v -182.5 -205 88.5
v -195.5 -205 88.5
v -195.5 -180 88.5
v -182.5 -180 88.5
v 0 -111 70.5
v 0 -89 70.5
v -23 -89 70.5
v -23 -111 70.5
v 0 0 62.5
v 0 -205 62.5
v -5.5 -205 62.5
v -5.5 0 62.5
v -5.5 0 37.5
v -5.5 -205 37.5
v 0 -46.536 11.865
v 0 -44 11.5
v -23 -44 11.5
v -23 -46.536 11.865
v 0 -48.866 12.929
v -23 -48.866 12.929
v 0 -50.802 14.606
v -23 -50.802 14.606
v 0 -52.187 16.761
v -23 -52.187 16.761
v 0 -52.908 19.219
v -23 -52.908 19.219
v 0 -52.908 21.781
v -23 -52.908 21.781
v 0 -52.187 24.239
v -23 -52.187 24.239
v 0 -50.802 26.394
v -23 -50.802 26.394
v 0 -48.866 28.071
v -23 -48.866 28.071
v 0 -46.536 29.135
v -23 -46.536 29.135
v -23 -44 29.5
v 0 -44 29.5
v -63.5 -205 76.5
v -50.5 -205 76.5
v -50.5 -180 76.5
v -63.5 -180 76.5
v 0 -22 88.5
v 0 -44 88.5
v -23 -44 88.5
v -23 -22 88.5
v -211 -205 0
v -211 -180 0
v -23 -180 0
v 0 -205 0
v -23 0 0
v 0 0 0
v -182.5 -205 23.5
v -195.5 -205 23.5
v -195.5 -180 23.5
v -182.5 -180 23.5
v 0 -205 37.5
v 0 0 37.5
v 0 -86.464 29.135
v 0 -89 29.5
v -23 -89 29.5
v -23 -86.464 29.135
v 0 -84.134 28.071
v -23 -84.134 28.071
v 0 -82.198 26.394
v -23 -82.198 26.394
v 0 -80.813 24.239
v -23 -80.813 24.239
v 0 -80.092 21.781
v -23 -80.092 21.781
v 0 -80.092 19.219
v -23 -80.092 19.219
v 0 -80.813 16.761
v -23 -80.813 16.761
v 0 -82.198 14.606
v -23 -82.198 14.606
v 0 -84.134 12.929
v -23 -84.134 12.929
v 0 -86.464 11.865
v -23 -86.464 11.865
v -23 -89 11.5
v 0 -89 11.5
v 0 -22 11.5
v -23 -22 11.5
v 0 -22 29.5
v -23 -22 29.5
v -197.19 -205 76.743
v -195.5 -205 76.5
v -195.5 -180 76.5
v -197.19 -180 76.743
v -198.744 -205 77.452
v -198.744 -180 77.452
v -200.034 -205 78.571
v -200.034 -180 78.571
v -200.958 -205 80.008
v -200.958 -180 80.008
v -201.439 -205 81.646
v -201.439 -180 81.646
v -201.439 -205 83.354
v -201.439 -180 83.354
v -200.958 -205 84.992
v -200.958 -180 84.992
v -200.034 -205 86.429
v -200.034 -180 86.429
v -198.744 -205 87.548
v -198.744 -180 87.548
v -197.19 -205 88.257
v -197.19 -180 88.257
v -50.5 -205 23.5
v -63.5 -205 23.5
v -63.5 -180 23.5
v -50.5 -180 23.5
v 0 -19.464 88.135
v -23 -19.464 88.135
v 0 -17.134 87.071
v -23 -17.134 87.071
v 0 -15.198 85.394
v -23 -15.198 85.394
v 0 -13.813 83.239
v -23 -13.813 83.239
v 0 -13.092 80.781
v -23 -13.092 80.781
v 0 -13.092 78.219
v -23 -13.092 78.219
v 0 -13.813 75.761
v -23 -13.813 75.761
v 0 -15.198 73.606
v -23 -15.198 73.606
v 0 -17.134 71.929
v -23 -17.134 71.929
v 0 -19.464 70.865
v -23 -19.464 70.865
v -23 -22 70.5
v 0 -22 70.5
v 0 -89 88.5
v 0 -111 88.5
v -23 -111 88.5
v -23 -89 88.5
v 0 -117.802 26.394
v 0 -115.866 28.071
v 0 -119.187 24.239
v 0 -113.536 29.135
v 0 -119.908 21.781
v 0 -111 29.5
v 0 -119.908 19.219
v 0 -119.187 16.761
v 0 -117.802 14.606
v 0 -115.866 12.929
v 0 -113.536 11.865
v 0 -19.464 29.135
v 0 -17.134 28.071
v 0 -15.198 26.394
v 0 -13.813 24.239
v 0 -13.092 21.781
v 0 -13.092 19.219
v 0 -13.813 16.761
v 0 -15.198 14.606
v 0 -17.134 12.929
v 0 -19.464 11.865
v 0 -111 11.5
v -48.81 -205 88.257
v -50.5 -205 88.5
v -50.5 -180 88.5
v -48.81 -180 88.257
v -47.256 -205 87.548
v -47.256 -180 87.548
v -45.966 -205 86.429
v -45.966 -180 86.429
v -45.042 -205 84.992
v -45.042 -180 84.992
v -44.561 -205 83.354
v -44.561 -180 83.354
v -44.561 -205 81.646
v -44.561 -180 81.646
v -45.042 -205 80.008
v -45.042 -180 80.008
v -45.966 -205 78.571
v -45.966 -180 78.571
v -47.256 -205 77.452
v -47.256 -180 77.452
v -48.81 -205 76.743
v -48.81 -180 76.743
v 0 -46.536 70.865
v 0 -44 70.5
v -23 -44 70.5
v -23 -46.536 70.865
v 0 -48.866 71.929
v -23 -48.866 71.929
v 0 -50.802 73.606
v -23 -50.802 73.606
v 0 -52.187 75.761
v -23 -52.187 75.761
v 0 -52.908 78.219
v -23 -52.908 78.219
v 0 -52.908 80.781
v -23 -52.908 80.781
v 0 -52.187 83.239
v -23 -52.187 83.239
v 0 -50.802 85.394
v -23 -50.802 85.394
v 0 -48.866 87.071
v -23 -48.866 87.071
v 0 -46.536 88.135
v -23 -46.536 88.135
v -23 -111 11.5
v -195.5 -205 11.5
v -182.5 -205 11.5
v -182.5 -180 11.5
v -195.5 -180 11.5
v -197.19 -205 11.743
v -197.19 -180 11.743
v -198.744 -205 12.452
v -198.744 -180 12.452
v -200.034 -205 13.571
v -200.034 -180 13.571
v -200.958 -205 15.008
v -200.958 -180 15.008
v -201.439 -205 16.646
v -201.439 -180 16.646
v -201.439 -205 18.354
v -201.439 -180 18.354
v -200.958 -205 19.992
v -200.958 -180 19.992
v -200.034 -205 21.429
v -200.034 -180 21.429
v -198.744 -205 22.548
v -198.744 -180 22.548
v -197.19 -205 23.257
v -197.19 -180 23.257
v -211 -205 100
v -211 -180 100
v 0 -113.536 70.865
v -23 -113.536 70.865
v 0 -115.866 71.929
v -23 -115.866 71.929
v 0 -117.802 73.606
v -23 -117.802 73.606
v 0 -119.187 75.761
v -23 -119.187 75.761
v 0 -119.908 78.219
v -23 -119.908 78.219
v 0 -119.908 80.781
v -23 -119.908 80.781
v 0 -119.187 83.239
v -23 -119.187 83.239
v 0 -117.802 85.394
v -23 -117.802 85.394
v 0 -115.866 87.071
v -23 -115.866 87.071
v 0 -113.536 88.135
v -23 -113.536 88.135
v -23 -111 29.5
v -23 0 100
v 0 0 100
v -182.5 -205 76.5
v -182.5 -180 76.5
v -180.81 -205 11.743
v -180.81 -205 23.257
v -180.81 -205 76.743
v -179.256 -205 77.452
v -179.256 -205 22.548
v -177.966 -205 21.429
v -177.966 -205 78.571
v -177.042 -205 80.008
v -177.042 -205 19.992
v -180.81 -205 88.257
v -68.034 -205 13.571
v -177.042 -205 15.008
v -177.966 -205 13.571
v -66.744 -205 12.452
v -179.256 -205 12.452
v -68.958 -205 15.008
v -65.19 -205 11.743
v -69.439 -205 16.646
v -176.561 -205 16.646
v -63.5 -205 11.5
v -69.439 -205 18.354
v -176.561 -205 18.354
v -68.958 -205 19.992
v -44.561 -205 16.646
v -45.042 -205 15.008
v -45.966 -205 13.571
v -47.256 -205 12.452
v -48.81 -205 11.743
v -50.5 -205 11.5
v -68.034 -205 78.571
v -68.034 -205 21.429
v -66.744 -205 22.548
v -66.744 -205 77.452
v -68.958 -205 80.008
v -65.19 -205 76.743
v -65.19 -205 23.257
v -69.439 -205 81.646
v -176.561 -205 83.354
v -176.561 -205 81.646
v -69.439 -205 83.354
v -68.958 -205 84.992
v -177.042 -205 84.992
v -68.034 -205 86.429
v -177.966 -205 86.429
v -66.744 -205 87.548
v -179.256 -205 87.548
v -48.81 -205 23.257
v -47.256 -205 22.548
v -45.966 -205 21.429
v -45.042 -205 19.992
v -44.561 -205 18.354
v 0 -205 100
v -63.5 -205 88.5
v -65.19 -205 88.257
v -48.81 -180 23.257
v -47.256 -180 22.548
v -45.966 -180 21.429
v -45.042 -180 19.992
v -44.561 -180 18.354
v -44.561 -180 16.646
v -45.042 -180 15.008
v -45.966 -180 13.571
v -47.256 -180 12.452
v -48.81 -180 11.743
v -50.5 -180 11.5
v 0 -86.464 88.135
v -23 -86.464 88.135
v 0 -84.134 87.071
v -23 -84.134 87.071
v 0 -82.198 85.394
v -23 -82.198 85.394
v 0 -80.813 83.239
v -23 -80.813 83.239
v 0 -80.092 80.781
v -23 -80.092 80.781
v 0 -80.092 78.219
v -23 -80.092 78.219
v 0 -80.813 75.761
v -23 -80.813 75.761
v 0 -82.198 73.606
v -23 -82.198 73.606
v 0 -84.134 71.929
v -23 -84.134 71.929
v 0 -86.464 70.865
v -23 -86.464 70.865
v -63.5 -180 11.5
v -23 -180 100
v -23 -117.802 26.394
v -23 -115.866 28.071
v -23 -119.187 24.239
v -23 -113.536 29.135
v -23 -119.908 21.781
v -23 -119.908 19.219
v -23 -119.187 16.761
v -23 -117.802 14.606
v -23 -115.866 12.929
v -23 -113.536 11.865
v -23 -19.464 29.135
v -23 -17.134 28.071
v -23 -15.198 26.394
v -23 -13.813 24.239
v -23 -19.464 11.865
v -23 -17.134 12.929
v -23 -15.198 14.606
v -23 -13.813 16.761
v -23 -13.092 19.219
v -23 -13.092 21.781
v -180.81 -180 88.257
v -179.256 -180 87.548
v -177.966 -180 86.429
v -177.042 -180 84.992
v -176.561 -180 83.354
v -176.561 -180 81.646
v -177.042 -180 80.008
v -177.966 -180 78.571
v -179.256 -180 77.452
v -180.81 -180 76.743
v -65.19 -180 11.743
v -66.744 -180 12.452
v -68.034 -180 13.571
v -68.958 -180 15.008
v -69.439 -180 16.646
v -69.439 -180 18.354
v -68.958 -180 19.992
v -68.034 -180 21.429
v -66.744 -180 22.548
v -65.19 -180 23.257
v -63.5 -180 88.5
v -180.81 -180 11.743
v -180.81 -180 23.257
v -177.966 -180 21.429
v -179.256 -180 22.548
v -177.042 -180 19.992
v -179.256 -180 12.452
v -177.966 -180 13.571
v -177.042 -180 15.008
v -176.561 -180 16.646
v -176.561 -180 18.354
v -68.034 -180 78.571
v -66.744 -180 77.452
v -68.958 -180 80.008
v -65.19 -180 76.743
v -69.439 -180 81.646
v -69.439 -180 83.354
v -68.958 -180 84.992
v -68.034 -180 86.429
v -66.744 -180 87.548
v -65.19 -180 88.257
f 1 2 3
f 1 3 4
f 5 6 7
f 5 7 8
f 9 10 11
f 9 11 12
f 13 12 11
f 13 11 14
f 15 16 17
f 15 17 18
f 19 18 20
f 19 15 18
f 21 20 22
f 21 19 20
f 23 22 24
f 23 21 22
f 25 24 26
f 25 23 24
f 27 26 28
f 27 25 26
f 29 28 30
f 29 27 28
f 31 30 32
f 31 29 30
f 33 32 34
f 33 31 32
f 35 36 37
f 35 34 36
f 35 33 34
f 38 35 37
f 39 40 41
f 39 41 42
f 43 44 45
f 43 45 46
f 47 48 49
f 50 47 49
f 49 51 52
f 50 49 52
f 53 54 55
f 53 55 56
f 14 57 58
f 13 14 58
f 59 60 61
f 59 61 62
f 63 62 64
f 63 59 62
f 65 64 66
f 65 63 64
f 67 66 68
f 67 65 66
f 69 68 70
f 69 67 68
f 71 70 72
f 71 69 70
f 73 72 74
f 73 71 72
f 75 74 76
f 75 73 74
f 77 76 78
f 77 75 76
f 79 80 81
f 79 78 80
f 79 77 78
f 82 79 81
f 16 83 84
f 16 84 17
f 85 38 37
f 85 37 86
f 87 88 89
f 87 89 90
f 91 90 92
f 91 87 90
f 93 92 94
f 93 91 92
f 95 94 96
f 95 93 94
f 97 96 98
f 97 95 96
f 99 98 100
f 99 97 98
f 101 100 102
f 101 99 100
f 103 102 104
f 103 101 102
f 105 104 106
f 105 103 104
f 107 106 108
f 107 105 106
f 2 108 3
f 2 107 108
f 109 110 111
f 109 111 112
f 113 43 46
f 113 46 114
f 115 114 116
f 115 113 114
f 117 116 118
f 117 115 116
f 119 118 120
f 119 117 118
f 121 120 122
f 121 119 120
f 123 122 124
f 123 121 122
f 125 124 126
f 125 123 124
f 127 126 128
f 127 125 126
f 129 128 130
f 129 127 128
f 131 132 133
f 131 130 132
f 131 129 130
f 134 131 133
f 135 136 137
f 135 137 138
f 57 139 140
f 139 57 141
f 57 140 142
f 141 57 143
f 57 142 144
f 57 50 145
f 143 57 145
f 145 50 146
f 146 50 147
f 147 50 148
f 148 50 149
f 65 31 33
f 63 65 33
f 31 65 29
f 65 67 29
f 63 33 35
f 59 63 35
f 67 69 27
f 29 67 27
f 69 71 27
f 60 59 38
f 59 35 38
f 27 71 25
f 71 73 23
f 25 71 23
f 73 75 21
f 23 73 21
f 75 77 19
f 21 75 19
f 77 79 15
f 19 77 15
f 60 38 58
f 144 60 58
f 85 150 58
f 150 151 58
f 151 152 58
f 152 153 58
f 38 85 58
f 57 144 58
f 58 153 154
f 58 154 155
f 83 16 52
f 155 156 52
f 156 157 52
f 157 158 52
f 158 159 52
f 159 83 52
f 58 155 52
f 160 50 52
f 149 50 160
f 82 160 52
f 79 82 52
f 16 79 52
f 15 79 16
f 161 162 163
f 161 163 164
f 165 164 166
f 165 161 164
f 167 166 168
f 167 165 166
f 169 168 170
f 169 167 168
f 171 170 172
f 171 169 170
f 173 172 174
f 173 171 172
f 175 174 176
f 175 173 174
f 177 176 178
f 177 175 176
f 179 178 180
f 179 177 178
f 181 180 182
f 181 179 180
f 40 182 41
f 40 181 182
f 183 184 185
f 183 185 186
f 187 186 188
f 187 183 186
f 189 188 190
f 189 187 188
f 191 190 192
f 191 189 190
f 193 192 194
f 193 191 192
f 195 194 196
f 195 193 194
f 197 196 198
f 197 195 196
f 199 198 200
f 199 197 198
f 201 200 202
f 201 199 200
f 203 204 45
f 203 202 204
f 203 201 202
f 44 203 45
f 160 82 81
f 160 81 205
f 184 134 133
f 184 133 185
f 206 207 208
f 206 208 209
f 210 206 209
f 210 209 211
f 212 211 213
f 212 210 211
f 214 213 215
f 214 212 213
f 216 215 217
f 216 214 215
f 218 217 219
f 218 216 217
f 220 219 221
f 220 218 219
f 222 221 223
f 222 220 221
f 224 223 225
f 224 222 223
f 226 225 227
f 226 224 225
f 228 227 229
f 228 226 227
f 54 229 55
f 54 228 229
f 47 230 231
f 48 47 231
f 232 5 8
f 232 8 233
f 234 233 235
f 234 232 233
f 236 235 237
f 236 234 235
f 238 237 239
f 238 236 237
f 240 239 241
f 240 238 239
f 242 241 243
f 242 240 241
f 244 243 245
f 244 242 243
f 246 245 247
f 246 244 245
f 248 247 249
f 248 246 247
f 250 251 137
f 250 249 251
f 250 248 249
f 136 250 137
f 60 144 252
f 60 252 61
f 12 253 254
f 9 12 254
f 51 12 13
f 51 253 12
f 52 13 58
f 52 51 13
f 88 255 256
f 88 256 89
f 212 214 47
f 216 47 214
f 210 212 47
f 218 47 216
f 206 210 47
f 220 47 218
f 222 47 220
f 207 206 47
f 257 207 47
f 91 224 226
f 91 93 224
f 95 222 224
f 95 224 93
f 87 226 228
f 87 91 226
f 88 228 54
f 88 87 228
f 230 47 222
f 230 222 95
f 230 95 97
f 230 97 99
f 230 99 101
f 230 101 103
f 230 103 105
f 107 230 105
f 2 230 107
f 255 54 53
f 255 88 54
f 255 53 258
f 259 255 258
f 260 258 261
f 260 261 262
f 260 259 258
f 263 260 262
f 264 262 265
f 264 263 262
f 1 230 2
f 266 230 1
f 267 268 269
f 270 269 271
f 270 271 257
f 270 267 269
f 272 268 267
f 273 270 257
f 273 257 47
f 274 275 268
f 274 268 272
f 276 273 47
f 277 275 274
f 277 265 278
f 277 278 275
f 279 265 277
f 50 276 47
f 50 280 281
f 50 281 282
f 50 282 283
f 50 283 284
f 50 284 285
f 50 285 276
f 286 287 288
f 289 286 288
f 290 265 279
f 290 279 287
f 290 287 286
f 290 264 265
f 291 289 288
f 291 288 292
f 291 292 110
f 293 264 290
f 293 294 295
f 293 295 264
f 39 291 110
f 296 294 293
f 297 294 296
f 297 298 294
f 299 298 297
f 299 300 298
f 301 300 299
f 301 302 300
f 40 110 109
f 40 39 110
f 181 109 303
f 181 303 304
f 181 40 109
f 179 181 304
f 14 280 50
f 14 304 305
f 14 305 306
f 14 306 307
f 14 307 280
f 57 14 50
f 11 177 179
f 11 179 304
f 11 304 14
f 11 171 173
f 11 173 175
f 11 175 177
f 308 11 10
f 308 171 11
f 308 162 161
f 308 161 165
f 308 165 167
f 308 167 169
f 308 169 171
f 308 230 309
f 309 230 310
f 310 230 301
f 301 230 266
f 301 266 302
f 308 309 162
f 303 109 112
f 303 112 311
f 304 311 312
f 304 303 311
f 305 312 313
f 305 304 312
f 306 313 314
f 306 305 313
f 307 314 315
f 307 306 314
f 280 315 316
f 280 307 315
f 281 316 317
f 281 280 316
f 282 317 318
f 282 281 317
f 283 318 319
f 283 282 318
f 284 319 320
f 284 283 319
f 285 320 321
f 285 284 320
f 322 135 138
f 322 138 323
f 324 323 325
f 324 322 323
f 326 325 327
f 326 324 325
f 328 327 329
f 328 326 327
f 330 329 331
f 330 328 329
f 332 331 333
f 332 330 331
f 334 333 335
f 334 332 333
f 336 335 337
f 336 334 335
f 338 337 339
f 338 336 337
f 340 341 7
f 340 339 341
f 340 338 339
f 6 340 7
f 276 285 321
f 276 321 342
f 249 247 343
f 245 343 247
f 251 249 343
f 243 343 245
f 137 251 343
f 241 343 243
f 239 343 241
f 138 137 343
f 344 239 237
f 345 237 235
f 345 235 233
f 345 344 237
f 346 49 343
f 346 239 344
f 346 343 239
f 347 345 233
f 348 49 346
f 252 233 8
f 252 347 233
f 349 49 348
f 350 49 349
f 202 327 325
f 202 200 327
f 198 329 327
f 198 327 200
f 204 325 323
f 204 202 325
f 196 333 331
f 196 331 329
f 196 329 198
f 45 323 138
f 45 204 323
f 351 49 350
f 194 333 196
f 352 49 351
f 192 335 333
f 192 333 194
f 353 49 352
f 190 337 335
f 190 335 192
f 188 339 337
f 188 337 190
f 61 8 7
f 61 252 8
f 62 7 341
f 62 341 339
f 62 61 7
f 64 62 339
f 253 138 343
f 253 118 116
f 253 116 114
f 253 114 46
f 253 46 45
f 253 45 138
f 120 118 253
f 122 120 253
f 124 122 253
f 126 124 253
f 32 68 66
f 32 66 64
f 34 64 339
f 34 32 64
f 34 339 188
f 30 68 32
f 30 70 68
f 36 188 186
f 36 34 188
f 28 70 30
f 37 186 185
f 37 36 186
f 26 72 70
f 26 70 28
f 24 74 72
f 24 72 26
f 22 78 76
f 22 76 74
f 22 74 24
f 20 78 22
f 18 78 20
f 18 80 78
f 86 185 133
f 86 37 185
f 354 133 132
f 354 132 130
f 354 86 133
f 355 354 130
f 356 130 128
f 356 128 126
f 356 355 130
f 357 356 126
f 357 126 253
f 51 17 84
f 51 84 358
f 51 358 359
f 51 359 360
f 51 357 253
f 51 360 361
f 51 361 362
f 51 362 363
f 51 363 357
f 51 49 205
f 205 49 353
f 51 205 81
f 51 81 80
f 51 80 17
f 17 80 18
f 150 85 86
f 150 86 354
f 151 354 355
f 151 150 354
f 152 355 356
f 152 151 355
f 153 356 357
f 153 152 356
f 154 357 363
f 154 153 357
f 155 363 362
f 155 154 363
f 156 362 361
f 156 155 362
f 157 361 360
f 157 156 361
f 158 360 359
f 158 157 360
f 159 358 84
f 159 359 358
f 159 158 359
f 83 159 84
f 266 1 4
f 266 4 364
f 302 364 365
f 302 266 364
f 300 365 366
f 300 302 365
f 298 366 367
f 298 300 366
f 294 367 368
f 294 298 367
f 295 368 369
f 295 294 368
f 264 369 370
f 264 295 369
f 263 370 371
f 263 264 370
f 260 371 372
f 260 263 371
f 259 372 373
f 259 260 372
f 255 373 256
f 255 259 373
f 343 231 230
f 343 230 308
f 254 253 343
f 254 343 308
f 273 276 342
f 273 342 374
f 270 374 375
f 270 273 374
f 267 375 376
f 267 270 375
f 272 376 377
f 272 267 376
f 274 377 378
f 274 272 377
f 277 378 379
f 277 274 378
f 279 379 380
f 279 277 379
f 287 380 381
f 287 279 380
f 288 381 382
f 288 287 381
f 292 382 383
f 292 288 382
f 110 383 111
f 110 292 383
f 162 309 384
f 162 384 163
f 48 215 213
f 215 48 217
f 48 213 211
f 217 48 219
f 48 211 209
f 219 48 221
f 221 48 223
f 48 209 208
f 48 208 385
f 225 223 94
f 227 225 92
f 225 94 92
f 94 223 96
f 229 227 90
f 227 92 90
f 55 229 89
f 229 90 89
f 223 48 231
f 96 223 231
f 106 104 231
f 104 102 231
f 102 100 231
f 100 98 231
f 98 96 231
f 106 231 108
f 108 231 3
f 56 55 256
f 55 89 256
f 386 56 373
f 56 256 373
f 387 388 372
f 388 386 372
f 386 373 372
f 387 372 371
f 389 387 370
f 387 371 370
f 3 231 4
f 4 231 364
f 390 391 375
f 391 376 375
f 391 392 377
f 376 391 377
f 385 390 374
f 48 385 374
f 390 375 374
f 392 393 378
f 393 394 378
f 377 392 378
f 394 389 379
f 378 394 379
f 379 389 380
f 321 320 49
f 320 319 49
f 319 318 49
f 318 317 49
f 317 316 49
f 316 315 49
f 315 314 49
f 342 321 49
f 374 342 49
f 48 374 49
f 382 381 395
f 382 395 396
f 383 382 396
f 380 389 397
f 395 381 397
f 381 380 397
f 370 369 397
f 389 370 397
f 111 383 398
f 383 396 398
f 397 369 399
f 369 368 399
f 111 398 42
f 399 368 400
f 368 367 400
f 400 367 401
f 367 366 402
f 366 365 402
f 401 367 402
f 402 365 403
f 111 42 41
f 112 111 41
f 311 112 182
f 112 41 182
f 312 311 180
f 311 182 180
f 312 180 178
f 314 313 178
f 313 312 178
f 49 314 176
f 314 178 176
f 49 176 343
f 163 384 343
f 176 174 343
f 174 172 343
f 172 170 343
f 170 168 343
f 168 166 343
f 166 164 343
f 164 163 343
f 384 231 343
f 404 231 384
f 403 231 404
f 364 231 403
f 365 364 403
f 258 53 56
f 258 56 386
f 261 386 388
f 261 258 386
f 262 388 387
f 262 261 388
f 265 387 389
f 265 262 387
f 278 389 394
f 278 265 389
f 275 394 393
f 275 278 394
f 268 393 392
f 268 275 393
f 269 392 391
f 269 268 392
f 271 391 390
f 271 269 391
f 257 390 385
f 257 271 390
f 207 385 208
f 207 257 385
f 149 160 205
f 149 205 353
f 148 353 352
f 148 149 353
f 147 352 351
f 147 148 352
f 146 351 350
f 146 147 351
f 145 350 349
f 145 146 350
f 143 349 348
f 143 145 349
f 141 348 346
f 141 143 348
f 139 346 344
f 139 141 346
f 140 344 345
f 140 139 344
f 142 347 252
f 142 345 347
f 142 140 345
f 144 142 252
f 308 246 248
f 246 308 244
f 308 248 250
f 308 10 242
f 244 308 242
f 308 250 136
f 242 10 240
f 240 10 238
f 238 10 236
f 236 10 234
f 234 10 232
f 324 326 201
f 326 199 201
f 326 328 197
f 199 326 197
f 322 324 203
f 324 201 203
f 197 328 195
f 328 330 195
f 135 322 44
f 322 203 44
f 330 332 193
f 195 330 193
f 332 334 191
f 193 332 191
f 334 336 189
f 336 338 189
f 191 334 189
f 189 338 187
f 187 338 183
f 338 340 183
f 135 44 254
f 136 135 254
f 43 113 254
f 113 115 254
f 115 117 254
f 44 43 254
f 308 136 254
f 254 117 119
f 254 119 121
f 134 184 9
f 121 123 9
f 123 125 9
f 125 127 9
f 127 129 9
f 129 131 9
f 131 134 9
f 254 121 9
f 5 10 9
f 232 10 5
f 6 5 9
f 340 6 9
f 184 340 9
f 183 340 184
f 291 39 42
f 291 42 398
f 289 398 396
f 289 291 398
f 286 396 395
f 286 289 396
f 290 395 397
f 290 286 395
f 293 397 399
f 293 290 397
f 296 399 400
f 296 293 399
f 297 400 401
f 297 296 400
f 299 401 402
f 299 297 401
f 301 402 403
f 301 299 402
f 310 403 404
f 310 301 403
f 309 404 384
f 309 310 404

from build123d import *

# Parameters (mm, degrees)
SKETCH_1_W          = 23
SKETCH_1_H          = 205
EXTRUDE_1_DEPTH     = 100
SKETCH_3_W          = 188
SKETCH_3_H          = 25
EXTRUDE_3_DEPTH     = 100
CUT_EXTRUDE_1_REACH = 312.719
CUT_EXTRUDE_2_REACH = 312.719
SKETCH_6_W          = 25
SKETCH_6_H          = 205
CUT_EXTRUDE_3_DEPTH = 5.5


with BuildPart() as part:
    # 草图1 → 凸台-拉伸1 (new body)
    with BuildSketch(Plane.XY):
        with Locations((-11.5, -102.5)):
            Rectangle(SKETCH_1_W, SKETCH_1_H)
    extrude(amount=EXTRUDE_1_DEPTH)

    # 草图3 → 凸台-拉伸3 (add)
    with BuildSketch(Plane.XY.offset(100)):
        with Locations((-117, -192.5)):
            Rectangle(SKETCH_3_W, SKETCH_3_H)
    extrude(amount=-EXTRUDE_3_DEPTH)

    # 草图4 → 切除-拉伸1 (cut, up to next)
    with BuildSketch(Plane(origin=(0, 0, 0), x_dir=(0, 0, -1), z_dir=(1, 0, 0)), mode=Mode.PRIVATE) as cut_extrude_1_sk1:
        with BuildLine():
            Line((-70.5, -22), (-70.5, -44))
            ThreePointArc((-70.5, -44), (-79.5, -53), (-88.5, -44))
            Line((-88.5, -44), (-88.5, -22))
            ThreePointArc((-88.5, -22), (-79.5, -13), (-70.5, -22))
        make_face()
    cut_extrude_1_tool1 = extrude(cut_extrude_1_sk1.sketch, amount=-CUT_EXTRUDE_1_REACH, mode=Mode.PRIVATE) & part.part
    # 草图4 → 切除-拉伸1 (cut, up to next)
    with BuildSketch(Plane(origin=(0, 0, 0), x_dir=(0, 0, -1), z_dir=(1, 0, 0)), mode=Mode.PRIVATE) as cut_extrude_1_sk2:
        with BuildLine():
            Line((-11.5, -22), (-11.5, -44))
            ThreePointArc((-11.5, -44), (-20.5, -53), (-29.5, -44))
            Line((-29.5, -44), (-29.5, -22))
            ThreePointArc((-29.5, -22), (-20.5, -13), (-11.5, -22))
        make_face()
    cut_extrude_1_tool2 = extrude(cut_extrude_1_sk2.sketch, amount=-CUT_EXTRUDE_1_REACH, mode=Mode.PRIVATE) & part.part
    # 草图4 → 切除-拉伸1 (cut, up to next)
    with BuildSketch(Plane(origin=(0, 0, 0), x_dir=(0, 0, -1), z_dir=(1, 0, 0)), mode=Mode.PRIVATE) as cut_extrude_1_sk3:
        with BuildLine():
            Line((-70.5, -89), (-70.5, -111))
            ThreePointArc((-70.5, -111), (-79.5, -120), (-88.5, -111))
            Line((-88.5, -111), (-88.5, -89))
            ThreePointArc((-88.5, -89), (-79.5, -80), (-70.5, -89))
        make_face()
    cut_extrude_1_tool3 = extrude(cut_extrude_1_sk3.sketch, amount=-CUT_EXTRUDE_1_REACH, mode=Mode.PRIVATE) & part.part
    # 草图4 → 切除-拉伸1 (cut, up to next)
    with BuildSketch(Plane(origin=(0, 0, 0), x_dir=(0, 0, -1), z_dir=(1, 0, 0)), mode=Mode.PRIVATE) as cut_extrude_1_sk4:
        with BuildLine():
            Line((-11.5, -89), (-11.5, -111))
            ThreePointArc((-11.5, -111), (-20.5, -120), (-29.5, -111))
            Line((-29.5, -111), (-29.5, -89))
            ThreePointArc((-29.5, -89), (-20.5, -80), (-11.5, -89))
        make_face()
    cut_extrude_1_tool4 = extrude(cut_extrude_1_sk4.sketch, amount=-CUT_EXTRUDE_1_REACH, mode=Mode.PRIVATE) & part.part
    add(cut_extrude_1_tool1.solids().sort_by_distance((0, -33, 79.5))[0], mode=Mode.SUBTRACT)
    add(cut_extrude_1_tool2.solids().sort_by_distance((0, -33, 20.5))[0], mode=Mode.SUBTRACT)
    add(cut_extrude_1_tool3.solids().sort_by_distance((0, -100, 79.5))[0], mode=Mode.SUBTRACT)
    add(cut_extrude_1_tool4.solids().sort_by_distance((0, -100, 20.5))[0], mode=Mode.SUBTRACT)

    # 草图5 → 切除-拉伸2 (cut, up to next)
    with BuildSketch(Plane.XZ.offset(205), mode=Mode.PRIVATE) as cut_extrude_2_sk1:
        with BuildLine():
            Line((-195.5, 88.5), (-182.5, 88.5))
            ThreePointArc((-182.5, 88.5), (-176.5, 82.5), (-182.5, 76.5))
            Line((-182.5, 76.5), (-195.5, 76.5))
            ThreePointArc((-195.5, 76.5), (-201.5, 82.5), (-195.5, 88.5))
        make_face()
    cut_extrude_2_tool1 = extrude(cut_extrude_2_sk1.sketch, amount=-CUT_EXTRUDE_2_REACH, mode=Mode.PRIVATE) & part.part
    # 草图5 → 切除-拉伸2 (cut, up to next)
    with BuildSketch(Plane.XZ.offset(205), mode=Mode.PRIVATE) as cut_extrude_2_sk2:
        with BuildLine():
            Line((-63.5, 88.5), (-50.5, 88.5))
            ThreePointArc((-50.5, 88.5), (-44.5, 82.5), (-50.5, 76.5))
            Line((-50.5, 76.5), (-63.5, 76.5))
            ThreePointArc((-63.5, 76.5), (-69.5, 82.5), (-63.5, 88.5))
        make_face()
    cut_extrude_2_tool2 = extrude(cut_extrude_2_sk2.sketch, amount=-CUT_EXTRUDE_2_REACH, mode=Mode.PRIVATE) & part.part
    # 草图5 → 切除-拉伸2 (cut, up to next)
    with BuildSketch(Plane.XZ.offset(205), mode=Mode.PRIVATE) as cut_extrude_2_sk3:
        with BuildLine():
            Line((-195.5, 23.5), (-182.5, 23.5))
            ThreePointArc((-182.5, 23.5), (-176.5, 17.5), (-182.5, 11.5))
            Line((-182.5, 11.5), (-195.5, 11.5))
            ThreePointArc((-195.5, 11.5), (-201.5, 17.5), (-195.5, 23.5))
        make_face()
    cut_extrude_2_tool3 = extrude(cut_extrude_2_sk3.sketch, amount=-CUT_EXTRUDE_2_REACH, mode=Mode.PRIVATE) & part.part
    # 草图5 → 切除-拉伸2 (cut, up to next)
    with BuildSketch(Plane.XZ.offset(205), mode=Mode.PRIVATE) as cut_extrude_2_sk4:
        with BuildLine():
            Line((-63.5, 23.5), (-50.5, 23.5))
            ThreePointArc((-50.5, 23.5), (-44.5, 17.5), (-50.5, 11.5))
            Line((-50.5, 11.5), (-63.5, 11.5))
            ThreePointArc((-63.5, 11.5), (-69.5, 17.5), (-63.5, 23.5))
        make_face()
    cut_extrude_2_tool4 = extrude(cut_extrude_2_sk4.sketch, amount=-CUT_EXTRUDE_2_REACH, mode=Mode.PRIVATE) & part.part
    add(cut_extrude_2_tool1.solids().sort_by_distance((-189, -205, 82.5))[0], mode=Mode.SUBTRACT)
    add(cut_extrude_2_tool2.solids().sort_by_distance((-57, -205, 82.5))[0], mode=Mode.SUBTRACT)
    add(cut_extrude_2_tool3.solids().sort_by_distance((-189, -205, 17.5))[0], mode=Mode.SUBTRACT)
    add(cut_extrude_2_tool4.solids().sort_by_distance((-57, -205, 17.5))[0], mode=Mode.SUBTRACT)

    # 草图6 → 切除-拉伸3 (cut)
    with BuildSketch(Plane(origin=(0, 0, 0), x_dir=(0, 0, -1), z_dir=(1, 0, 0))):
        with Locations((-50, -102.5)):
            Rectangle(SKETCH_6_W, SKETCH_6_H)
    extrude(amount=-CUT_EXTRUDE_3_DEPTH, mode=Mode.SUBTRACT)


solid = part.part
